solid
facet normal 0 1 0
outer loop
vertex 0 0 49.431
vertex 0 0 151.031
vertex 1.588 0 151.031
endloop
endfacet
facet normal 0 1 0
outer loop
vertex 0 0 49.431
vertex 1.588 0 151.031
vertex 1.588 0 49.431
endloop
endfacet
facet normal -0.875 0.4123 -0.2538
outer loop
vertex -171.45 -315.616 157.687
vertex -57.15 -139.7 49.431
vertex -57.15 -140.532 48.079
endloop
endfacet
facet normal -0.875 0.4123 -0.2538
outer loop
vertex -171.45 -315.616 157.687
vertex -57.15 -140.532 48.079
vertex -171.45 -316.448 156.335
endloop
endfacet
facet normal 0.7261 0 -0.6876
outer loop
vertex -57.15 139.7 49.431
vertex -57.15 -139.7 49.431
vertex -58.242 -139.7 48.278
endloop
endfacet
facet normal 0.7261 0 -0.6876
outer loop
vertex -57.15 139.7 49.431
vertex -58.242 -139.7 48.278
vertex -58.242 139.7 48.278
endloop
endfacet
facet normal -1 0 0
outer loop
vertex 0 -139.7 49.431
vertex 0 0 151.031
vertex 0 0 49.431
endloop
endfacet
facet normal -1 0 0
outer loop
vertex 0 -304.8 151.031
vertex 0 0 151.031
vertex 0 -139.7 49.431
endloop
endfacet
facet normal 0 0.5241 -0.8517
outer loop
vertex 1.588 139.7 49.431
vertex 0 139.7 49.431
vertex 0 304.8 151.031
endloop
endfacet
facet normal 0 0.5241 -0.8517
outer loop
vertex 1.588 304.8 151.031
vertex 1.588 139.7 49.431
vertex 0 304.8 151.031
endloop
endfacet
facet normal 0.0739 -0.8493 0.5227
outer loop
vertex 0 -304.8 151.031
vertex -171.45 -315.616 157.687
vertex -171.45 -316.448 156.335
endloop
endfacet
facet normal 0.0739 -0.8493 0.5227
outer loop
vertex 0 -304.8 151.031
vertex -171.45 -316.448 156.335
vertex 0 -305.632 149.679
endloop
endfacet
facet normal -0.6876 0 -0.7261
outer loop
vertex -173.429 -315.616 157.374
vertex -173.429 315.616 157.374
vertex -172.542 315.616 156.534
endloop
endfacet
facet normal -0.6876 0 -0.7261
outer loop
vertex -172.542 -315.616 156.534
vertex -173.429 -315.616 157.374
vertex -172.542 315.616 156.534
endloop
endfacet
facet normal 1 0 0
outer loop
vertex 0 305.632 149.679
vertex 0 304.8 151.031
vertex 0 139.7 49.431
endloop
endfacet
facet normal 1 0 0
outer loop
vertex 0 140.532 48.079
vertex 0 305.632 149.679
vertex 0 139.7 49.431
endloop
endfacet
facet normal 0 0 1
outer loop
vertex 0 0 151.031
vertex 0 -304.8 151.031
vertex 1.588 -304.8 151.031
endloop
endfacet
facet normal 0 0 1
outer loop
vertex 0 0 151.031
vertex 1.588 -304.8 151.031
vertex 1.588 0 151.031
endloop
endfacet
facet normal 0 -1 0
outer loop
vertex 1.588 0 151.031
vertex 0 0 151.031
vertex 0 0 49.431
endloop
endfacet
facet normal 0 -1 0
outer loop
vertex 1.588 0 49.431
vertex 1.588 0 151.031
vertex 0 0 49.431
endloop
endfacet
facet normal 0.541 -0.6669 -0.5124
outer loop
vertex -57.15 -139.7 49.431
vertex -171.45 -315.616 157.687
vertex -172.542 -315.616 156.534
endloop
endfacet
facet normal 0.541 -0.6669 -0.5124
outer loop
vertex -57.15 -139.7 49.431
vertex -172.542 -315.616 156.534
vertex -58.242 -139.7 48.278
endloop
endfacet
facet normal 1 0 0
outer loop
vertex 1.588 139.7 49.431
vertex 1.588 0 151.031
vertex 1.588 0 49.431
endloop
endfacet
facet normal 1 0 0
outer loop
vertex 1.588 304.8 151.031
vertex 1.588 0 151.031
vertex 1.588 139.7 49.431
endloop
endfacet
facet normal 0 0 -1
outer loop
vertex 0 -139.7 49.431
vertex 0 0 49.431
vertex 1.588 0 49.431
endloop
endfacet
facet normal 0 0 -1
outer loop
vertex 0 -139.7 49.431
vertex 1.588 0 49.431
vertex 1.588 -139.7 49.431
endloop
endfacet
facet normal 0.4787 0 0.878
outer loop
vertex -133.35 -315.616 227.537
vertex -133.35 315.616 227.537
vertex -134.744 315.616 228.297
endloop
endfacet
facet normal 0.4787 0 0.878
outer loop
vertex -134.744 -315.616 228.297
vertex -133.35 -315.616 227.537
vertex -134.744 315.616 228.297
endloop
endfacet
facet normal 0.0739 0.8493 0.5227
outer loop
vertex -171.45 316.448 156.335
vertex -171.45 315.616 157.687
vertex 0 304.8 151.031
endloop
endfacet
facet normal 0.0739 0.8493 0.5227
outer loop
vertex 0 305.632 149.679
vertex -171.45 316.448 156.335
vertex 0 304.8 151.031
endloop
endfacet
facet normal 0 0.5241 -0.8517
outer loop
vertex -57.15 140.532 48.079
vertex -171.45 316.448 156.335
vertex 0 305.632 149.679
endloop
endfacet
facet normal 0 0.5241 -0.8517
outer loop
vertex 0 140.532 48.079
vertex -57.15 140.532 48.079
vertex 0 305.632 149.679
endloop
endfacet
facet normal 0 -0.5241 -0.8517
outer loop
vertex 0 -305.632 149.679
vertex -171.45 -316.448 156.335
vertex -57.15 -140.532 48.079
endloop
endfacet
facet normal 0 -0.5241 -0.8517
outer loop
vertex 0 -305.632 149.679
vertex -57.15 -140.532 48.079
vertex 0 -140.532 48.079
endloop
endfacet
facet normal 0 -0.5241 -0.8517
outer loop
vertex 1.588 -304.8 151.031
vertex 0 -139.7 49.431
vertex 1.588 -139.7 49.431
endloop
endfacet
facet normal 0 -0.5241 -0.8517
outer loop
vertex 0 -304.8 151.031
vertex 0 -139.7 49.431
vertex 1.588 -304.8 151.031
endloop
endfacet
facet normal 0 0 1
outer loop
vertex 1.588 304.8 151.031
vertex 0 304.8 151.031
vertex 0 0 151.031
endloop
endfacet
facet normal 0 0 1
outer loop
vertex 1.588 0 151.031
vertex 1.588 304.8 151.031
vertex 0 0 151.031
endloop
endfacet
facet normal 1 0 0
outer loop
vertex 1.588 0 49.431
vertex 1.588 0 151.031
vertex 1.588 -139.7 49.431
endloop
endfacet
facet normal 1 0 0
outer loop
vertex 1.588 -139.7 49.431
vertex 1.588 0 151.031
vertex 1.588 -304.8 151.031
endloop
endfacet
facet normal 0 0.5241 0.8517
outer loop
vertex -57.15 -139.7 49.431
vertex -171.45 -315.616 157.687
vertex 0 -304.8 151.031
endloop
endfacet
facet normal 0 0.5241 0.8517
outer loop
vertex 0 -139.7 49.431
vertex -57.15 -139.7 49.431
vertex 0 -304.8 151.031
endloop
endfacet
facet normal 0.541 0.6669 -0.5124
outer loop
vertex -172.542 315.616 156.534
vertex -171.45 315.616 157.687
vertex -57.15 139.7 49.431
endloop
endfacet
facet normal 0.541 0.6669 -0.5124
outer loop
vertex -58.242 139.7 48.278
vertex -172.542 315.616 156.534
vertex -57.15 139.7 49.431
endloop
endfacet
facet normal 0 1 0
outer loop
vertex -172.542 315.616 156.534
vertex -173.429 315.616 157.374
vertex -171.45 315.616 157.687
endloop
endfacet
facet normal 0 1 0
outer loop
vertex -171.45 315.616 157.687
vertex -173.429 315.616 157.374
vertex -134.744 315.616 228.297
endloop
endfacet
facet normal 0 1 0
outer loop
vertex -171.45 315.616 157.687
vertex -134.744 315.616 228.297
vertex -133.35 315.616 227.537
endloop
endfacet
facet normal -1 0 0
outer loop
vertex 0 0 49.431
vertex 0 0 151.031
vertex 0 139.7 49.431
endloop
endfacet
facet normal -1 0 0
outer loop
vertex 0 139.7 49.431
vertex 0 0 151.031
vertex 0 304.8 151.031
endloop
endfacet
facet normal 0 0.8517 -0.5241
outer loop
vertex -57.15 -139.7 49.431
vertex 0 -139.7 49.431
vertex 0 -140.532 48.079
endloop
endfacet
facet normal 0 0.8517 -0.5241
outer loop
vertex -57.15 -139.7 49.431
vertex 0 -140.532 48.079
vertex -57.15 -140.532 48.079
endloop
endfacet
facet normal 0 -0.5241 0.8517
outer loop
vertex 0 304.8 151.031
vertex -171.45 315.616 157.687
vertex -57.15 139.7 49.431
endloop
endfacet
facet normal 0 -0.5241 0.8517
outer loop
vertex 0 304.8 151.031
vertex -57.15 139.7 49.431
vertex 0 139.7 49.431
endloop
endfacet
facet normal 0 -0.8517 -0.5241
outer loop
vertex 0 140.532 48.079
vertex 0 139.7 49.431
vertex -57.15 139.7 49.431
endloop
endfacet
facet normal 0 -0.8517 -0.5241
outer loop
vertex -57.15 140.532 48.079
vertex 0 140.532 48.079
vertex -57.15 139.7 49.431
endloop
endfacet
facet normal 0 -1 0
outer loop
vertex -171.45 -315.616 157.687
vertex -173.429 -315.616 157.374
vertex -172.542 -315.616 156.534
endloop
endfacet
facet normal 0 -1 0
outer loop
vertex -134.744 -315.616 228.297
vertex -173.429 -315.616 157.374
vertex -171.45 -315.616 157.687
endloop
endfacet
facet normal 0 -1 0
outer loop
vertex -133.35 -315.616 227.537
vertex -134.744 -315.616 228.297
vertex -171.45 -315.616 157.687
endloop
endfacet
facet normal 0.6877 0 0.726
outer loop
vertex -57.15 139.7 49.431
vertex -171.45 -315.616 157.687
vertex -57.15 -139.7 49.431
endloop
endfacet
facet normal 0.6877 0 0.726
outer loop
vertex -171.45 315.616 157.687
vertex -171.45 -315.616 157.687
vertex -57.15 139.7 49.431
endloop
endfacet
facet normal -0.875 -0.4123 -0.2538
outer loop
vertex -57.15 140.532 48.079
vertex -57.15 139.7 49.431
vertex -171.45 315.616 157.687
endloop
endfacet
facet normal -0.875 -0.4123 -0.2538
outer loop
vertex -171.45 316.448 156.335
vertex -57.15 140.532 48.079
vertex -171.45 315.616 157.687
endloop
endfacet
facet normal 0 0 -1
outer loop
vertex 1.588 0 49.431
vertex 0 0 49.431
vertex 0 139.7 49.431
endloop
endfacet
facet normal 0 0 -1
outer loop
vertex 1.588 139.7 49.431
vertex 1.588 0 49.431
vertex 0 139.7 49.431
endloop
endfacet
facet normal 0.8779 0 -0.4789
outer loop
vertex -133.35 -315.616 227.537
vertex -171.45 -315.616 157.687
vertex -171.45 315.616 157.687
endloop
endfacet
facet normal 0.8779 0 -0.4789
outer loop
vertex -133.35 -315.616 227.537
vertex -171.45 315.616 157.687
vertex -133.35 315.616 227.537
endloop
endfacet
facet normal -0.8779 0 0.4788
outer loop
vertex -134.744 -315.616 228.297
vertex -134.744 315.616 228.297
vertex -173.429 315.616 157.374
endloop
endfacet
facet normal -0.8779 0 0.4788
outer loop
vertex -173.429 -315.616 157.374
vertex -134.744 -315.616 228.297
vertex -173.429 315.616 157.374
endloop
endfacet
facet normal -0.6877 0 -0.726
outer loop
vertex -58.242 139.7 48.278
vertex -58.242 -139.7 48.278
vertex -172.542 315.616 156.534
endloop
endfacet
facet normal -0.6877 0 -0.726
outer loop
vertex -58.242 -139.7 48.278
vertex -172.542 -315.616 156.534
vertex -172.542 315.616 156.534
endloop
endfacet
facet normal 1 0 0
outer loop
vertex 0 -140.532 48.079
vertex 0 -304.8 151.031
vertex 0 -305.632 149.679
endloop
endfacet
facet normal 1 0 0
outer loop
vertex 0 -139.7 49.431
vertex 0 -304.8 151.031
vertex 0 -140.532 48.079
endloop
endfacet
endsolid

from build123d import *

# Parameters (mm, degrees)
F1_DEPTH = 1.5875
F3_DEPTH = 1.5875
F7_DEPTH = 1.5875
F9_DEPTH = 315.6160606221


with BuildPart() as f1:
    # F0 (on Right) → F1 (new body)
    with BuildSketch(Plane.YZ):
        Polygon((139.7, 49.4305624351), (304.8, 151.0305624351), (0, 151.0305624351), (0, 49.4305624351), align=None)
    extrude(amount=F1_DEPTH)


with BuildPart() as f3:
    # F2 (on face) → F3 (new body)
    with BuildSketch(Plane(origin=(0, 16.3091051792, -26.5022959161), x_dir=(1, 0, 0), z_dir=(0, 0.5240974257, -0.8516583167))):
        Polygon((0, -338.7401839004), (0, -144.883097365), (-57.15, -144.883097365), (-171.45, -351.4401839004), align=None)
    extrude(amount=F3_DEPTH)



with BuildPart() as f7:
    # F6 (on 3pt) → F7 (new body)
    with BuildSketch(Plane(origin=(-2.345266266, 0, -2.4762030911), x_dir=(0.7260420263, 0, -0.6876503297), z_dir=(-0.6876503297, 0, -0.7260420263))):
        Polygon((-75.484244363, -139.7), (-75.484244363, 0), (-232.9131477231, 0), (-232.9131477231, -315.6160606221), align=None)
    extrude(amount=F7_DEPTH)


with BuildPart() as f3_1:
    add(f3.part)

    add(f7.part)  # F9 merges F7
    # F8 (on face) → F9 (join)
    with BuildSketch(Plane.XZ):
        Polygon((-173.4287163172, 157.3741728239), (-172.5416448985, 156.5340080243), (-171.45, 157.6865997411), (-133.35, 227.5365997411), (-134.743659222, 228.2967774985), align=None)
    extrude(amount=-F9_DEPTH)

    # F10: F3, F1 across plane


with BuildPart() as f3_2:
    add(f3_1.part)
    add(f3_1.part.mirror(Plane.XZ))
    add(f1.part.mirror(Plane.XZ))


solid = Compound([f1.part, f3_2.part])
